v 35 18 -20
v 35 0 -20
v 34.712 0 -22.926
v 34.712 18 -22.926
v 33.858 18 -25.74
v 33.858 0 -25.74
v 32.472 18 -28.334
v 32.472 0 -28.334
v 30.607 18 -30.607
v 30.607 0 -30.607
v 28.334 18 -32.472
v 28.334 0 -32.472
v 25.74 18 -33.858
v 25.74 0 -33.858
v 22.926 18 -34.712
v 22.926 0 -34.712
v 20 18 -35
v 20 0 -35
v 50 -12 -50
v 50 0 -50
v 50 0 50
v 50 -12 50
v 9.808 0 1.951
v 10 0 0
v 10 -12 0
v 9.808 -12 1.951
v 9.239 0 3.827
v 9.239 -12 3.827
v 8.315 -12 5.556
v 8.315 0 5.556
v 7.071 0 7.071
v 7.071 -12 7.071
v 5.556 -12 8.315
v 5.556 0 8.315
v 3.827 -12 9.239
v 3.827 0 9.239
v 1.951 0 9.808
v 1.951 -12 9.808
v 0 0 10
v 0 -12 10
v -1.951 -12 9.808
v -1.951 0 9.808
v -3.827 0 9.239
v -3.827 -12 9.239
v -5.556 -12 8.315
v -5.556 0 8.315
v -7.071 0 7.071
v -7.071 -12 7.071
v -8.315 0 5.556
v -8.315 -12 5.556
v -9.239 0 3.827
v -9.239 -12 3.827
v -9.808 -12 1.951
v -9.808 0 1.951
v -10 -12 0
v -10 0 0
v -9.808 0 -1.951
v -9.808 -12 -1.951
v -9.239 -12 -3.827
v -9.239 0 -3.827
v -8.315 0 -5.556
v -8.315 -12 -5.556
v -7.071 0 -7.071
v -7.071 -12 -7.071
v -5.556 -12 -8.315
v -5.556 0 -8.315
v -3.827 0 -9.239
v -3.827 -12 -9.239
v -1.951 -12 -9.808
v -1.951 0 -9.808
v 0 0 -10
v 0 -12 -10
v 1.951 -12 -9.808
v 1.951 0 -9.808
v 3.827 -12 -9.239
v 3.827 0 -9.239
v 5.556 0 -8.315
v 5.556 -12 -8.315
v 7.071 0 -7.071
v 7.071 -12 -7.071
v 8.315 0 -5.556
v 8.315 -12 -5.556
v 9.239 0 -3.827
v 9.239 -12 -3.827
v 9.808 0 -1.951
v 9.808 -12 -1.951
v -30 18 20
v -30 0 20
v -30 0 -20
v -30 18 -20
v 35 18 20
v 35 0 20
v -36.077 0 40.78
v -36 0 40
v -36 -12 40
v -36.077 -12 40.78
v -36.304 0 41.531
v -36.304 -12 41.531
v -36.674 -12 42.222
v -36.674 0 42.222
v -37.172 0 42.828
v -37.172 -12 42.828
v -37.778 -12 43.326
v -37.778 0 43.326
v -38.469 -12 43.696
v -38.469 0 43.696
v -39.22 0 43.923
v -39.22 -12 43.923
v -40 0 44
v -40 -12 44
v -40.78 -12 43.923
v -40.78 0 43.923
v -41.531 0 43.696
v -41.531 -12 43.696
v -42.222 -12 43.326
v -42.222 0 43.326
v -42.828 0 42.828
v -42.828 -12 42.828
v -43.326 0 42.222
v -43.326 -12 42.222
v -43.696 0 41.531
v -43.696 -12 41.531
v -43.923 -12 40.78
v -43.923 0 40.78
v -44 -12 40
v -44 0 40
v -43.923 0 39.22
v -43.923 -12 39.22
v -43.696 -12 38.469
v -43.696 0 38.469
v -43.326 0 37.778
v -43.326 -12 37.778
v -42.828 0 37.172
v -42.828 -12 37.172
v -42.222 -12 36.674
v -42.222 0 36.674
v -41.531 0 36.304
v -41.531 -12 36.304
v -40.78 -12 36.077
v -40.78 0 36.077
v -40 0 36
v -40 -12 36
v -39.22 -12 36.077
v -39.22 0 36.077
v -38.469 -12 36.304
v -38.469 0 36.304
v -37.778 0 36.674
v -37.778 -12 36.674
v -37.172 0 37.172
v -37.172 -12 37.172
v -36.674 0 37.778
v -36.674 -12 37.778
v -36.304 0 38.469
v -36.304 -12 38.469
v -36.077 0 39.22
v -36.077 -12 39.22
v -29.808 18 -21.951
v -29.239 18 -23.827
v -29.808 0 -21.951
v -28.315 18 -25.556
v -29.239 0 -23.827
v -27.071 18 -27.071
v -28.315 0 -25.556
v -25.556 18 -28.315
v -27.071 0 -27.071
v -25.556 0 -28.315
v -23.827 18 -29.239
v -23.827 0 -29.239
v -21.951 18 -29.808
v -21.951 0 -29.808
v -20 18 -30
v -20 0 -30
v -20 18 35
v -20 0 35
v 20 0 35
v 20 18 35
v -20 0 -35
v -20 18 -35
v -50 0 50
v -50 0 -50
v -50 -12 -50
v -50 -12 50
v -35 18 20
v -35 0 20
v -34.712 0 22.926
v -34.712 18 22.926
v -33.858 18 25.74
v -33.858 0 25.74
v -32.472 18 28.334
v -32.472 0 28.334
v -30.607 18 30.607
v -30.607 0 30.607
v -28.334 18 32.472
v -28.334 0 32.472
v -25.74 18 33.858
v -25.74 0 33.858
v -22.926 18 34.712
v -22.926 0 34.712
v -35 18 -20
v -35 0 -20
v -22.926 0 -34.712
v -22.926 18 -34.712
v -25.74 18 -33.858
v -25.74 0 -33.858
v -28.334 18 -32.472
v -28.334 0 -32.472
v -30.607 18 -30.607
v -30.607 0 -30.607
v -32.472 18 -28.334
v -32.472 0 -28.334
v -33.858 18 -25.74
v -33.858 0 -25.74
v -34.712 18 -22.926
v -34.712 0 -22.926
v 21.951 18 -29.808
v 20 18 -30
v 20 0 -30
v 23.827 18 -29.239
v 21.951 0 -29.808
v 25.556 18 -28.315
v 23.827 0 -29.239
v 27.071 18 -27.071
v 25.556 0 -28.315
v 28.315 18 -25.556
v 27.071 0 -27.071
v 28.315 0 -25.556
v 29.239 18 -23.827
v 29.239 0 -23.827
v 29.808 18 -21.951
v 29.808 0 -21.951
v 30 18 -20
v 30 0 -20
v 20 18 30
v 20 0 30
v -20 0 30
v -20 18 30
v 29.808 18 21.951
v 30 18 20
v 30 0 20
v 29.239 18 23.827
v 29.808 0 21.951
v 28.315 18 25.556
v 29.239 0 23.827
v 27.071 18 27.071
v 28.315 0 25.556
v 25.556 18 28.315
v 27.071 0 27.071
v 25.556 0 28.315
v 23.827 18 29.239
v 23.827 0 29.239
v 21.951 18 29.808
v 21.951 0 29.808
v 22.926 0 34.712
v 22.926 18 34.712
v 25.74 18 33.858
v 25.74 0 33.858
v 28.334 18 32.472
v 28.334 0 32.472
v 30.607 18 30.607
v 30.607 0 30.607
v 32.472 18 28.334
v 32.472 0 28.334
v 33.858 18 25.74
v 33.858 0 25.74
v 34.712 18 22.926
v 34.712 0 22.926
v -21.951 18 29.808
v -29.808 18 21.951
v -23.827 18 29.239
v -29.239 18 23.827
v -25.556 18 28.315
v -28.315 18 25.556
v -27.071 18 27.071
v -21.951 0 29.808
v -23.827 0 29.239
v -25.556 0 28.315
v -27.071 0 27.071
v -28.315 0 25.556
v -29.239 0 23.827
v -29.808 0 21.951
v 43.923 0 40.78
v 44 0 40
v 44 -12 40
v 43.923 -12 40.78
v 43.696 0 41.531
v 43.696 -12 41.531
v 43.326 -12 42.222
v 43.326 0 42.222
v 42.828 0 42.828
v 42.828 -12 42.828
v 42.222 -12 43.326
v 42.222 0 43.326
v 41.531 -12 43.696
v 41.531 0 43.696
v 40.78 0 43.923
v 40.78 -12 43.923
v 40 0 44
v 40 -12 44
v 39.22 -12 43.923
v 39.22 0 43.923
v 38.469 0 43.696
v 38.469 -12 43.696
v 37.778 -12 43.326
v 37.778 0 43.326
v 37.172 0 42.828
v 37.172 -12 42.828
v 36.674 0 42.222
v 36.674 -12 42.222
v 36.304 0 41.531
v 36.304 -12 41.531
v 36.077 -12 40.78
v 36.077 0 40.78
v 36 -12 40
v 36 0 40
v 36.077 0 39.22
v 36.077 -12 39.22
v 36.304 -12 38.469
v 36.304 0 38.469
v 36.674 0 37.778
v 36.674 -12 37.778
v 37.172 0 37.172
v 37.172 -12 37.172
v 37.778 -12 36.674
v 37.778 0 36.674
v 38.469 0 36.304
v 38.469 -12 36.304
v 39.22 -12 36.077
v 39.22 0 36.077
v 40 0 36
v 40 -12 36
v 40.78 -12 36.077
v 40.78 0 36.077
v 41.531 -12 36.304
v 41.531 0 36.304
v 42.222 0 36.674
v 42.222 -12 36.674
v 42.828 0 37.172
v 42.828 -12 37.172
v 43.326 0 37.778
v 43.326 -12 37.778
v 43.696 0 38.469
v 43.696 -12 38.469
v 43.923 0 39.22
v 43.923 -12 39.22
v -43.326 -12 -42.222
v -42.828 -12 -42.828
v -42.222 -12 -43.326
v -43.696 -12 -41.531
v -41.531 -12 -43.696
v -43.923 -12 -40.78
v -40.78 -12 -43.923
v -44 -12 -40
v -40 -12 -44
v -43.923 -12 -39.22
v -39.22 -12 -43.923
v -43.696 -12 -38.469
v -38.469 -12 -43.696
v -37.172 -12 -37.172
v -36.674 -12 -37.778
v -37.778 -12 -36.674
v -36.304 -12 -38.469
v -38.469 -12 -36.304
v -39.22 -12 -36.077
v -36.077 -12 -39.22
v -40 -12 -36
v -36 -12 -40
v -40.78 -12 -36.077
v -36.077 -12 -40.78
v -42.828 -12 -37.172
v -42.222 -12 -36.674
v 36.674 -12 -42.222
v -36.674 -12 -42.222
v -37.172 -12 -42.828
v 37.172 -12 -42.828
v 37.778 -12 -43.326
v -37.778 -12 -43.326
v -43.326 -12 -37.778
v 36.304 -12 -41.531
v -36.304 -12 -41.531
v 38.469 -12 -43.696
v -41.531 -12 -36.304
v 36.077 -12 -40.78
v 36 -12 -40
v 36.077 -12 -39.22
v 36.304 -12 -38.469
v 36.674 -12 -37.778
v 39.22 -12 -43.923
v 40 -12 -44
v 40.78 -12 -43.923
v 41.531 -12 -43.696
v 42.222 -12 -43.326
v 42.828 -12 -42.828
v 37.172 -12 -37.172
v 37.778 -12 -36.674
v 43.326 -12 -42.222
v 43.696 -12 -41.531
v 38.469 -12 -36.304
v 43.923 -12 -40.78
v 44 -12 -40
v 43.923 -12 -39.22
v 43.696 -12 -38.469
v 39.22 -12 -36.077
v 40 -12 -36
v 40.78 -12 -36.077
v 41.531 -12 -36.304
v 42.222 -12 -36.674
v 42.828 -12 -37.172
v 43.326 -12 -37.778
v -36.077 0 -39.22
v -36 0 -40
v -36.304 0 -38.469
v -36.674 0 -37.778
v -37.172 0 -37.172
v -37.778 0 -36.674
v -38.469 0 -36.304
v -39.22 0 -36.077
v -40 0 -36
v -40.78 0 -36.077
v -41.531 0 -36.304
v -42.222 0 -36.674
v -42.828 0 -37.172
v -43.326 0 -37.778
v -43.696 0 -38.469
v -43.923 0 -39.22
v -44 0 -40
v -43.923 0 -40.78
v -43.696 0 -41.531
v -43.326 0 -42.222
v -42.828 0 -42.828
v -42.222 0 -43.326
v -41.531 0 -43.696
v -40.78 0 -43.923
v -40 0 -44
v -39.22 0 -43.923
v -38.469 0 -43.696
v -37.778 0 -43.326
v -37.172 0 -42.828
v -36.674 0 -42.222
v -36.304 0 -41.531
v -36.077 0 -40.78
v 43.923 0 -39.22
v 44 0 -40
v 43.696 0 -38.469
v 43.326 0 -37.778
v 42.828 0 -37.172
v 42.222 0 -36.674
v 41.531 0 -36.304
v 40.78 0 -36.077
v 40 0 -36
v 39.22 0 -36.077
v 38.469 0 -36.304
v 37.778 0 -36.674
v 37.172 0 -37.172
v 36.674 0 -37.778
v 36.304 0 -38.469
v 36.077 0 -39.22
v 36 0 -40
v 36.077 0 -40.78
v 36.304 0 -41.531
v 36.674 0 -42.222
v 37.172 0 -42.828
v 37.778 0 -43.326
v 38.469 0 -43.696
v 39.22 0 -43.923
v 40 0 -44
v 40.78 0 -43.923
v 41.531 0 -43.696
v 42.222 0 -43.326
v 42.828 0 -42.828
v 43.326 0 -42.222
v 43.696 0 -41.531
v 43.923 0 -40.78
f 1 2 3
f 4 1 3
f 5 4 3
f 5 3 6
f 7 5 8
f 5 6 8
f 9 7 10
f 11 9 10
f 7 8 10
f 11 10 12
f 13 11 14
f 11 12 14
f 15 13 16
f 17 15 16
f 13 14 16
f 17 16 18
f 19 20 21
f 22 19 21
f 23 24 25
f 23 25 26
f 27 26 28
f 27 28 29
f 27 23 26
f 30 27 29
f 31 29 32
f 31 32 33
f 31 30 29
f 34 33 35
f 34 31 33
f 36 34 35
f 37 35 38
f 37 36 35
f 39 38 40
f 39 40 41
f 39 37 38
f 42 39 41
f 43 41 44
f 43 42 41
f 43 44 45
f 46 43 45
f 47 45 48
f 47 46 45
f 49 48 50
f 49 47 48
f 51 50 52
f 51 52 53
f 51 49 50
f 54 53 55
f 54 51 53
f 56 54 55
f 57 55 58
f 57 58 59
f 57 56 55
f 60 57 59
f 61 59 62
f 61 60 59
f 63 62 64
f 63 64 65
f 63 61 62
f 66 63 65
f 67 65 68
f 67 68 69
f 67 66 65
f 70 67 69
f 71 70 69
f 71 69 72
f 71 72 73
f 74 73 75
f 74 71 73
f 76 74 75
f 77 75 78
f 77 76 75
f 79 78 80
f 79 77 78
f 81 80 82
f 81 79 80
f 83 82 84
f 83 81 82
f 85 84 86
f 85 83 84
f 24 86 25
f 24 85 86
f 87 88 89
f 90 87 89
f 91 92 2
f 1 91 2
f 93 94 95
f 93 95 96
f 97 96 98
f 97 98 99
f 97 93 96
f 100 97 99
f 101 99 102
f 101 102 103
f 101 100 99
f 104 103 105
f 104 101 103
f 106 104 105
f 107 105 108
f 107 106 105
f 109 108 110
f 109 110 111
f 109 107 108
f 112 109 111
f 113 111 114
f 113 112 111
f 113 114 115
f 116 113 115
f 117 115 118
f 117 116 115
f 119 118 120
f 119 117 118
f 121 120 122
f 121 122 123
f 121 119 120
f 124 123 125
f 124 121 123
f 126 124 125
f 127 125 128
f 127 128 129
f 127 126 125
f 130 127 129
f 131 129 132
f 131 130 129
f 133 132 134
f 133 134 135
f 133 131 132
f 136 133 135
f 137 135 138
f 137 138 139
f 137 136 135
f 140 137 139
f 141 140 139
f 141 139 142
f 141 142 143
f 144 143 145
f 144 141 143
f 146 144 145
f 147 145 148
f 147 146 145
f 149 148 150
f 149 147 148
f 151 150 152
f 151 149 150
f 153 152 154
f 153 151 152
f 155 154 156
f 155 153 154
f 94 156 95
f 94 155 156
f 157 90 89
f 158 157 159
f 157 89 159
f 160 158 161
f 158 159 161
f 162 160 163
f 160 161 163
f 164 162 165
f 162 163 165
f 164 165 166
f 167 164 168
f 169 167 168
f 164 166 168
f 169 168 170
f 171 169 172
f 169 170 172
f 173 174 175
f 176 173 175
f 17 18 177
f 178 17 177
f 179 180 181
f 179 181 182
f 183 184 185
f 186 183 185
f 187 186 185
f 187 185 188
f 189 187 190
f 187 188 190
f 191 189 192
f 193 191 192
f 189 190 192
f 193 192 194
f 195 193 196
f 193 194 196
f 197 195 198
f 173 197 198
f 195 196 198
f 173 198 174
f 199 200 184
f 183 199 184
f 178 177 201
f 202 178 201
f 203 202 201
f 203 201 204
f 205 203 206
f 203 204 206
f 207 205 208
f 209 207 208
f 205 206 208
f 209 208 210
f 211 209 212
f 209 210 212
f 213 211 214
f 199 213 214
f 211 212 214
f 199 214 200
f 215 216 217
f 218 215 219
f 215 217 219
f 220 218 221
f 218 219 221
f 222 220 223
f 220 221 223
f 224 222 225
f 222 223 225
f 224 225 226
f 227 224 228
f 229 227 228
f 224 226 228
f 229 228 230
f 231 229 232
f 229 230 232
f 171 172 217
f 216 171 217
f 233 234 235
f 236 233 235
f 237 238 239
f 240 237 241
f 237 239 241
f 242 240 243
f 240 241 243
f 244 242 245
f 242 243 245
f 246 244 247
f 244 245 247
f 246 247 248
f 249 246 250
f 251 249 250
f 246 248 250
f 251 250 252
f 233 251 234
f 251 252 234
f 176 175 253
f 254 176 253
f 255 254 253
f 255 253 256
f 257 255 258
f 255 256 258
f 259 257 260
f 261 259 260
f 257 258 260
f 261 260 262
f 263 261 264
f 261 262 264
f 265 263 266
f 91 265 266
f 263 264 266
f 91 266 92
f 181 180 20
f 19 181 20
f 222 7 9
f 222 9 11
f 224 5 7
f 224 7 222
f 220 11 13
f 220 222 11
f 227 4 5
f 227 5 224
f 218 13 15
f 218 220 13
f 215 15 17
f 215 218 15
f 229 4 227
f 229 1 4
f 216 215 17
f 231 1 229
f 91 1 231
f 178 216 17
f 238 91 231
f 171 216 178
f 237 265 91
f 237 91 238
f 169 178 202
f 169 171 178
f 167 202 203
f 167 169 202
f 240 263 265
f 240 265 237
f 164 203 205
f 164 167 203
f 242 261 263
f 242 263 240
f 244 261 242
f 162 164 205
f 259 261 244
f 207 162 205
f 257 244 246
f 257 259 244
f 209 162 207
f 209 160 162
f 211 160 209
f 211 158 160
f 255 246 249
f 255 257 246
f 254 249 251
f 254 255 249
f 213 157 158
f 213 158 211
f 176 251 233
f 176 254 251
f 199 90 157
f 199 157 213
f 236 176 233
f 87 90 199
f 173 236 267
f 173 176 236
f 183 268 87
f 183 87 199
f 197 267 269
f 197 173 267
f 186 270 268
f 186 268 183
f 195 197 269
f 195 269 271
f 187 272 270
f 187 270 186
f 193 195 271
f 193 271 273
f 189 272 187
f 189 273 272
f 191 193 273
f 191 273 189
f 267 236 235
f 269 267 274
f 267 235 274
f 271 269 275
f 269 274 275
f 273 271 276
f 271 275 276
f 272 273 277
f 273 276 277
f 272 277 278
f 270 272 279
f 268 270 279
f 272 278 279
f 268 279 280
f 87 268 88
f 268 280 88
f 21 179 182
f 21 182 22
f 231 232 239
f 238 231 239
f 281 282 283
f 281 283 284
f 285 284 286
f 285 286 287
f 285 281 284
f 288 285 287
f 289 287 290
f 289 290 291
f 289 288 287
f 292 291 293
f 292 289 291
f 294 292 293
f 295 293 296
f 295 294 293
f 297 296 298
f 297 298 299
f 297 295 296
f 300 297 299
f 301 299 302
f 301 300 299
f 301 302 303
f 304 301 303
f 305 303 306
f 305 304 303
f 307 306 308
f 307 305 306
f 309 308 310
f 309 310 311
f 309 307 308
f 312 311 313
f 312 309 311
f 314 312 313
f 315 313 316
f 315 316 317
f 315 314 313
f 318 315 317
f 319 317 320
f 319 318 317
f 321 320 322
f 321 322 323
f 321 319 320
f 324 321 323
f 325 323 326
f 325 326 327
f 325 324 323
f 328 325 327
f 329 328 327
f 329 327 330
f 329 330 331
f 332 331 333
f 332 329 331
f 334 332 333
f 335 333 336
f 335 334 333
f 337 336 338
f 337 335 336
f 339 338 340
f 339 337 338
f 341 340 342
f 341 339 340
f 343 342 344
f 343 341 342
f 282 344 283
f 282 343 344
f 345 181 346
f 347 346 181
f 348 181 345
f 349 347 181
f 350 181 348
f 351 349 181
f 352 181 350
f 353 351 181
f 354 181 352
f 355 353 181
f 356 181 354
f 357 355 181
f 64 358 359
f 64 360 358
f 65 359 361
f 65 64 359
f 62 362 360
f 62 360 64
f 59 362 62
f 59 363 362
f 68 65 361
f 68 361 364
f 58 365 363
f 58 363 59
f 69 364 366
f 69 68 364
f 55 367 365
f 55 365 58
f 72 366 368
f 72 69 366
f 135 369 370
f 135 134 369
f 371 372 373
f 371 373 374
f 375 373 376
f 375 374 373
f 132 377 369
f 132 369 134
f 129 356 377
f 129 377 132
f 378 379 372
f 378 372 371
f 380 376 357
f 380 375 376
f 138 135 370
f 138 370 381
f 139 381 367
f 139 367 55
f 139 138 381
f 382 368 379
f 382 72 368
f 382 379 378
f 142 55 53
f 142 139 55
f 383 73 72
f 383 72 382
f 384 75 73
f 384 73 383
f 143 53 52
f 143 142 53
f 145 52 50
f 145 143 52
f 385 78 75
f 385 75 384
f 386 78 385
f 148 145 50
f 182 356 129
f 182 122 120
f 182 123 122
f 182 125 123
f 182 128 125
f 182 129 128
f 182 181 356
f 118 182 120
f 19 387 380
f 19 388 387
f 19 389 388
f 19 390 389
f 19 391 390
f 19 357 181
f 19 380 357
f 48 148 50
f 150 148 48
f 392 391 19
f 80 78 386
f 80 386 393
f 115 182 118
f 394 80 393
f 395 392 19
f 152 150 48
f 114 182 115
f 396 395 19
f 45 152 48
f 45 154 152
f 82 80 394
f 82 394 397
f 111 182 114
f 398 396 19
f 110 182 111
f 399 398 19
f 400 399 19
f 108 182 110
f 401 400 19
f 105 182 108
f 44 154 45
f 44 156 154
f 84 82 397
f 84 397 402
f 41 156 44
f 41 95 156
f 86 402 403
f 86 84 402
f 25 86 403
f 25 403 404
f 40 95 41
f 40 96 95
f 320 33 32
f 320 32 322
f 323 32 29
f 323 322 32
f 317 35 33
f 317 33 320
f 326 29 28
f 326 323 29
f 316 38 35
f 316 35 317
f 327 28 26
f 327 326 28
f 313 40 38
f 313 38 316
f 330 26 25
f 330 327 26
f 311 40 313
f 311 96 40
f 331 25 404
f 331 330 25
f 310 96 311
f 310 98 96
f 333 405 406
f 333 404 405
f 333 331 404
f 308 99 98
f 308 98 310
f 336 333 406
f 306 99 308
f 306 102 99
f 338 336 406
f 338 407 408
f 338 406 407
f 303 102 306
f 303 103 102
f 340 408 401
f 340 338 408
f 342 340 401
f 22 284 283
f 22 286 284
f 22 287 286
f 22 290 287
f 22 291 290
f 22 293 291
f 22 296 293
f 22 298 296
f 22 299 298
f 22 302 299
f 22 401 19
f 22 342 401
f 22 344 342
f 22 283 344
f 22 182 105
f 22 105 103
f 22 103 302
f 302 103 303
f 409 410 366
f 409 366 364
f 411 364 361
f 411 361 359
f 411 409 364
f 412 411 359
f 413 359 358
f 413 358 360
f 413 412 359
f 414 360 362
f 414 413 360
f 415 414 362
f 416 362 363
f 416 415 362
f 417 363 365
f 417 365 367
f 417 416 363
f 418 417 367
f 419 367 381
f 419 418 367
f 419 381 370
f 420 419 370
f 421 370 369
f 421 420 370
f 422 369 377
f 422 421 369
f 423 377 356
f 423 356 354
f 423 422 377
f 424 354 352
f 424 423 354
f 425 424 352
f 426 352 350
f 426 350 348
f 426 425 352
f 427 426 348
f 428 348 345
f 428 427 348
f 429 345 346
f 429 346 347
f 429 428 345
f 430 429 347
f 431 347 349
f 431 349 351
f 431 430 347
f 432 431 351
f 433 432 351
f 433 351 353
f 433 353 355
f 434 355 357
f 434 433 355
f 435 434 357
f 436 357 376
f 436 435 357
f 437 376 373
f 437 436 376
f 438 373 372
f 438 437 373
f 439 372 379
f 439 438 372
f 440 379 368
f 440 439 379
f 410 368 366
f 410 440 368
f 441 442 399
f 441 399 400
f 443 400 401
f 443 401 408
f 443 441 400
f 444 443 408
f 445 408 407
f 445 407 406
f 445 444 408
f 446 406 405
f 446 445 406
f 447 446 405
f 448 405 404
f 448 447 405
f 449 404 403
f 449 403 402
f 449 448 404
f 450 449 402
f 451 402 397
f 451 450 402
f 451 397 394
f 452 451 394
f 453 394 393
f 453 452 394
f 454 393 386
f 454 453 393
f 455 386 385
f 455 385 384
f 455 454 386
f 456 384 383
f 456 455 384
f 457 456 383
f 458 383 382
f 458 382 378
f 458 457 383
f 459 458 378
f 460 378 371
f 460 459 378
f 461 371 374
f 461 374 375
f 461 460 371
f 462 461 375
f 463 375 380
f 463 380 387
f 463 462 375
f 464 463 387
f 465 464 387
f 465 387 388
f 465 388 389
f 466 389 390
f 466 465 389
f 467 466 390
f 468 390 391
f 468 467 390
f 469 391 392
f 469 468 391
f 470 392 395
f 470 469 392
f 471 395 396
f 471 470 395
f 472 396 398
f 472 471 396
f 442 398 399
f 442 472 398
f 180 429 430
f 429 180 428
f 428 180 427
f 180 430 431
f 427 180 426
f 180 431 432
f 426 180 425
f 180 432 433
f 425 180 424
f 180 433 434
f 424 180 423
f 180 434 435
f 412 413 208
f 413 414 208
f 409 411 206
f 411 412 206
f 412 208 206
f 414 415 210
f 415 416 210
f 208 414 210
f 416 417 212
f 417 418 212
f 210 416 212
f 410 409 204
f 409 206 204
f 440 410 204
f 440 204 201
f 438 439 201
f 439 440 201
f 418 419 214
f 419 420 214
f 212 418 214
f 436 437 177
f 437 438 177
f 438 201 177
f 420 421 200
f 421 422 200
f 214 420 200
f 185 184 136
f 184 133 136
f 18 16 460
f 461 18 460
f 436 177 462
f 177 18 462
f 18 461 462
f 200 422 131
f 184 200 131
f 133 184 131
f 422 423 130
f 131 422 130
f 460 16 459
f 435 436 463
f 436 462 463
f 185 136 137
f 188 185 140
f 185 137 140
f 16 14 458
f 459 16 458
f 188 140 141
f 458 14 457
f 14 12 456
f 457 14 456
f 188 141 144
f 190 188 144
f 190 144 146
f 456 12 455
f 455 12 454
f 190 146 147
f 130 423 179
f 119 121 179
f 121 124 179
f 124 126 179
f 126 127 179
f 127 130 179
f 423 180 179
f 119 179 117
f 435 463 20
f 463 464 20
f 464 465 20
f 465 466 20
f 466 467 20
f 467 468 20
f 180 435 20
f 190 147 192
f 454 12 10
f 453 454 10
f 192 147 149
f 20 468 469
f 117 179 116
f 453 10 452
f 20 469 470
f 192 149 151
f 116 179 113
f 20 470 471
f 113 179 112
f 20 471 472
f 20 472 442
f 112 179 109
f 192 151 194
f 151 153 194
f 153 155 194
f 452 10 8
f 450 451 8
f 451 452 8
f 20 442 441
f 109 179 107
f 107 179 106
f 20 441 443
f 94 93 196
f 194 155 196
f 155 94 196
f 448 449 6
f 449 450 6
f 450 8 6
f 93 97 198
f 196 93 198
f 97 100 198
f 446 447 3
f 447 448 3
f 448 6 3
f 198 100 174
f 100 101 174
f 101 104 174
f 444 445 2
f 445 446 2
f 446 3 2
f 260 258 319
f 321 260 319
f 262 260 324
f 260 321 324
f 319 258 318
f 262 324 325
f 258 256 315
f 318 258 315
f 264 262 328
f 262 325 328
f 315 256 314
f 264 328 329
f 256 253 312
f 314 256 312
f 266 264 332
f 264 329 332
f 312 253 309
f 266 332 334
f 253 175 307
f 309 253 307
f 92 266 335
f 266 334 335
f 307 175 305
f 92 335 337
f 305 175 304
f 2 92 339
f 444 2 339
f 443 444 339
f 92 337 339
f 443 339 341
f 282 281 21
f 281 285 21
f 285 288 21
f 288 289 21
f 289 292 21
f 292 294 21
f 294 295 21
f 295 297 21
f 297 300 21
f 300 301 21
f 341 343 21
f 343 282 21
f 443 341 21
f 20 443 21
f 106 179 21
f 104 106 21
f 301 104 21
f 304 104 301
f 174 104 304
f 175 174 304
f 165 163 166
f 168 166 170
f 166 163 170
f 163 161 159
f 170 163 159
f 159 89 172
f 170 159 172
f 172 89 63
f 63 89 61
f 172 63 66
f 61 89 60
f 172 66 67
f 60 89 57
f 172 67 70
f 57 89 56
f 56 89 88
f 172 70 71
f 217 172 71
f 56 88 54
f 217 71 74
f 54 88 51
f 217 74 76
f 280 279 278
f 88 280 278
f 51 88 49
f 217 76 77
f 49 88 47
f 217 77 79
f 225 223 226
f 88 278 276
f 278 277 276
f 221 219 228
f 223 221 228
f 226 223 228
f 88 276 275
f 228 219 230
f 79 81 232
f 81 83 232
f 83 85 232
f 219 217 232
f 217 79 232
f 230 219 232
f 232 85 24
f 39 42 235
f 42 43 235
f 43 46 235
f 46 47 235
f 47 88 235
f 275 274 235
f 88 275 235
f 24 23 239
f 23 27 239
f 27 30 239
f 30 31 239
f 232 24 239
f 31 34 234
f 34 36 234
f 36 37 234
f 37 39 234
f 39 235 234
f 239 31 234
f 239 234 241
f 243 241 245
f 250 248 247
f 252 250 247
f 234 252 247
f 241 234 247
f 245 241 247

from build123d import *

# Parameters (mm, degrees)
F0_W     = 100
F0_H     = 100
F0_R     = 4
F0_R_2   = 10
F1_DEPTH = 12
F3_DEPTH = 18


with BuildPart() as f1:
    # F0 (on Front) → F1 (new body)
    with BuildSketch(Plane.XZ):
        Rectangle(F0_W, F0_H)
        with Locations((-40, -40)):
            Circle(F0_R, mode=Mode.SUBTRACT)
        with Locations((40, -40)):
            Circle(F0_R, mode=Mode.SUBTRACT)
        with Locations((-40, 40)):
            Circle(F0_R, mode=Mode.SUBTRACT)
        Circle(F0_R_2, mode=Mode.SUBTRACT)
        with Locations((40, 40)):
            Circle(F0_R, mode=Mode.SUBTRACT)
    extrude(amount=F1_DEPTH)

    # F2 (on face) → F3 (join)
    with BuildSketch(Plane(origin=(0, 0, 0), x_dir=(-1, 0, 0), z_dir=(0, 1, 0))):
        with BuildLine():
            ThreePointArc((-20, 35), (-30.606602, 30.606602), (-35, 20))
            Line((-35, 20), (-35, -20))
            ThreePointArc((-35, -20), (-30.606602, -30.606602), (-20, -35))
            Line((-20, -35), (20, -35))
            ThreePointArc((20, -35), (30.606602, -30.606602), (35, -20))
            Line((35, -20), (35, 20))
            ThreePointArc((35, 20), (30.606602, 30.606602), (20, 35))
            Line((20, 35), (-20, 35))
        make_face()
        with BuildLine():
            Line((-30, -20), (-30, 20))
            ThreePointArc((-30, 20), (-27.071068, 27.071068), (-20, 30))
            Line((-20, 30), (20, 30))
            ThreePointArc((20, 30), (27.071068, 27.071068), (30, 20))
            Line((30, 20), (30, -20))
            ThreePointArc((30, -20), (27.071068, -27.071068), (20, -30))
            Line((20, -30), (-20, -30))
            ThreePointArc((-20, -30), (-27.071068, -27.071068), (-30, -20))
        make_face(mode=Mode.SUBTRACT)
    extrude(amount=F3_DEPTH)


solid = f1.part
